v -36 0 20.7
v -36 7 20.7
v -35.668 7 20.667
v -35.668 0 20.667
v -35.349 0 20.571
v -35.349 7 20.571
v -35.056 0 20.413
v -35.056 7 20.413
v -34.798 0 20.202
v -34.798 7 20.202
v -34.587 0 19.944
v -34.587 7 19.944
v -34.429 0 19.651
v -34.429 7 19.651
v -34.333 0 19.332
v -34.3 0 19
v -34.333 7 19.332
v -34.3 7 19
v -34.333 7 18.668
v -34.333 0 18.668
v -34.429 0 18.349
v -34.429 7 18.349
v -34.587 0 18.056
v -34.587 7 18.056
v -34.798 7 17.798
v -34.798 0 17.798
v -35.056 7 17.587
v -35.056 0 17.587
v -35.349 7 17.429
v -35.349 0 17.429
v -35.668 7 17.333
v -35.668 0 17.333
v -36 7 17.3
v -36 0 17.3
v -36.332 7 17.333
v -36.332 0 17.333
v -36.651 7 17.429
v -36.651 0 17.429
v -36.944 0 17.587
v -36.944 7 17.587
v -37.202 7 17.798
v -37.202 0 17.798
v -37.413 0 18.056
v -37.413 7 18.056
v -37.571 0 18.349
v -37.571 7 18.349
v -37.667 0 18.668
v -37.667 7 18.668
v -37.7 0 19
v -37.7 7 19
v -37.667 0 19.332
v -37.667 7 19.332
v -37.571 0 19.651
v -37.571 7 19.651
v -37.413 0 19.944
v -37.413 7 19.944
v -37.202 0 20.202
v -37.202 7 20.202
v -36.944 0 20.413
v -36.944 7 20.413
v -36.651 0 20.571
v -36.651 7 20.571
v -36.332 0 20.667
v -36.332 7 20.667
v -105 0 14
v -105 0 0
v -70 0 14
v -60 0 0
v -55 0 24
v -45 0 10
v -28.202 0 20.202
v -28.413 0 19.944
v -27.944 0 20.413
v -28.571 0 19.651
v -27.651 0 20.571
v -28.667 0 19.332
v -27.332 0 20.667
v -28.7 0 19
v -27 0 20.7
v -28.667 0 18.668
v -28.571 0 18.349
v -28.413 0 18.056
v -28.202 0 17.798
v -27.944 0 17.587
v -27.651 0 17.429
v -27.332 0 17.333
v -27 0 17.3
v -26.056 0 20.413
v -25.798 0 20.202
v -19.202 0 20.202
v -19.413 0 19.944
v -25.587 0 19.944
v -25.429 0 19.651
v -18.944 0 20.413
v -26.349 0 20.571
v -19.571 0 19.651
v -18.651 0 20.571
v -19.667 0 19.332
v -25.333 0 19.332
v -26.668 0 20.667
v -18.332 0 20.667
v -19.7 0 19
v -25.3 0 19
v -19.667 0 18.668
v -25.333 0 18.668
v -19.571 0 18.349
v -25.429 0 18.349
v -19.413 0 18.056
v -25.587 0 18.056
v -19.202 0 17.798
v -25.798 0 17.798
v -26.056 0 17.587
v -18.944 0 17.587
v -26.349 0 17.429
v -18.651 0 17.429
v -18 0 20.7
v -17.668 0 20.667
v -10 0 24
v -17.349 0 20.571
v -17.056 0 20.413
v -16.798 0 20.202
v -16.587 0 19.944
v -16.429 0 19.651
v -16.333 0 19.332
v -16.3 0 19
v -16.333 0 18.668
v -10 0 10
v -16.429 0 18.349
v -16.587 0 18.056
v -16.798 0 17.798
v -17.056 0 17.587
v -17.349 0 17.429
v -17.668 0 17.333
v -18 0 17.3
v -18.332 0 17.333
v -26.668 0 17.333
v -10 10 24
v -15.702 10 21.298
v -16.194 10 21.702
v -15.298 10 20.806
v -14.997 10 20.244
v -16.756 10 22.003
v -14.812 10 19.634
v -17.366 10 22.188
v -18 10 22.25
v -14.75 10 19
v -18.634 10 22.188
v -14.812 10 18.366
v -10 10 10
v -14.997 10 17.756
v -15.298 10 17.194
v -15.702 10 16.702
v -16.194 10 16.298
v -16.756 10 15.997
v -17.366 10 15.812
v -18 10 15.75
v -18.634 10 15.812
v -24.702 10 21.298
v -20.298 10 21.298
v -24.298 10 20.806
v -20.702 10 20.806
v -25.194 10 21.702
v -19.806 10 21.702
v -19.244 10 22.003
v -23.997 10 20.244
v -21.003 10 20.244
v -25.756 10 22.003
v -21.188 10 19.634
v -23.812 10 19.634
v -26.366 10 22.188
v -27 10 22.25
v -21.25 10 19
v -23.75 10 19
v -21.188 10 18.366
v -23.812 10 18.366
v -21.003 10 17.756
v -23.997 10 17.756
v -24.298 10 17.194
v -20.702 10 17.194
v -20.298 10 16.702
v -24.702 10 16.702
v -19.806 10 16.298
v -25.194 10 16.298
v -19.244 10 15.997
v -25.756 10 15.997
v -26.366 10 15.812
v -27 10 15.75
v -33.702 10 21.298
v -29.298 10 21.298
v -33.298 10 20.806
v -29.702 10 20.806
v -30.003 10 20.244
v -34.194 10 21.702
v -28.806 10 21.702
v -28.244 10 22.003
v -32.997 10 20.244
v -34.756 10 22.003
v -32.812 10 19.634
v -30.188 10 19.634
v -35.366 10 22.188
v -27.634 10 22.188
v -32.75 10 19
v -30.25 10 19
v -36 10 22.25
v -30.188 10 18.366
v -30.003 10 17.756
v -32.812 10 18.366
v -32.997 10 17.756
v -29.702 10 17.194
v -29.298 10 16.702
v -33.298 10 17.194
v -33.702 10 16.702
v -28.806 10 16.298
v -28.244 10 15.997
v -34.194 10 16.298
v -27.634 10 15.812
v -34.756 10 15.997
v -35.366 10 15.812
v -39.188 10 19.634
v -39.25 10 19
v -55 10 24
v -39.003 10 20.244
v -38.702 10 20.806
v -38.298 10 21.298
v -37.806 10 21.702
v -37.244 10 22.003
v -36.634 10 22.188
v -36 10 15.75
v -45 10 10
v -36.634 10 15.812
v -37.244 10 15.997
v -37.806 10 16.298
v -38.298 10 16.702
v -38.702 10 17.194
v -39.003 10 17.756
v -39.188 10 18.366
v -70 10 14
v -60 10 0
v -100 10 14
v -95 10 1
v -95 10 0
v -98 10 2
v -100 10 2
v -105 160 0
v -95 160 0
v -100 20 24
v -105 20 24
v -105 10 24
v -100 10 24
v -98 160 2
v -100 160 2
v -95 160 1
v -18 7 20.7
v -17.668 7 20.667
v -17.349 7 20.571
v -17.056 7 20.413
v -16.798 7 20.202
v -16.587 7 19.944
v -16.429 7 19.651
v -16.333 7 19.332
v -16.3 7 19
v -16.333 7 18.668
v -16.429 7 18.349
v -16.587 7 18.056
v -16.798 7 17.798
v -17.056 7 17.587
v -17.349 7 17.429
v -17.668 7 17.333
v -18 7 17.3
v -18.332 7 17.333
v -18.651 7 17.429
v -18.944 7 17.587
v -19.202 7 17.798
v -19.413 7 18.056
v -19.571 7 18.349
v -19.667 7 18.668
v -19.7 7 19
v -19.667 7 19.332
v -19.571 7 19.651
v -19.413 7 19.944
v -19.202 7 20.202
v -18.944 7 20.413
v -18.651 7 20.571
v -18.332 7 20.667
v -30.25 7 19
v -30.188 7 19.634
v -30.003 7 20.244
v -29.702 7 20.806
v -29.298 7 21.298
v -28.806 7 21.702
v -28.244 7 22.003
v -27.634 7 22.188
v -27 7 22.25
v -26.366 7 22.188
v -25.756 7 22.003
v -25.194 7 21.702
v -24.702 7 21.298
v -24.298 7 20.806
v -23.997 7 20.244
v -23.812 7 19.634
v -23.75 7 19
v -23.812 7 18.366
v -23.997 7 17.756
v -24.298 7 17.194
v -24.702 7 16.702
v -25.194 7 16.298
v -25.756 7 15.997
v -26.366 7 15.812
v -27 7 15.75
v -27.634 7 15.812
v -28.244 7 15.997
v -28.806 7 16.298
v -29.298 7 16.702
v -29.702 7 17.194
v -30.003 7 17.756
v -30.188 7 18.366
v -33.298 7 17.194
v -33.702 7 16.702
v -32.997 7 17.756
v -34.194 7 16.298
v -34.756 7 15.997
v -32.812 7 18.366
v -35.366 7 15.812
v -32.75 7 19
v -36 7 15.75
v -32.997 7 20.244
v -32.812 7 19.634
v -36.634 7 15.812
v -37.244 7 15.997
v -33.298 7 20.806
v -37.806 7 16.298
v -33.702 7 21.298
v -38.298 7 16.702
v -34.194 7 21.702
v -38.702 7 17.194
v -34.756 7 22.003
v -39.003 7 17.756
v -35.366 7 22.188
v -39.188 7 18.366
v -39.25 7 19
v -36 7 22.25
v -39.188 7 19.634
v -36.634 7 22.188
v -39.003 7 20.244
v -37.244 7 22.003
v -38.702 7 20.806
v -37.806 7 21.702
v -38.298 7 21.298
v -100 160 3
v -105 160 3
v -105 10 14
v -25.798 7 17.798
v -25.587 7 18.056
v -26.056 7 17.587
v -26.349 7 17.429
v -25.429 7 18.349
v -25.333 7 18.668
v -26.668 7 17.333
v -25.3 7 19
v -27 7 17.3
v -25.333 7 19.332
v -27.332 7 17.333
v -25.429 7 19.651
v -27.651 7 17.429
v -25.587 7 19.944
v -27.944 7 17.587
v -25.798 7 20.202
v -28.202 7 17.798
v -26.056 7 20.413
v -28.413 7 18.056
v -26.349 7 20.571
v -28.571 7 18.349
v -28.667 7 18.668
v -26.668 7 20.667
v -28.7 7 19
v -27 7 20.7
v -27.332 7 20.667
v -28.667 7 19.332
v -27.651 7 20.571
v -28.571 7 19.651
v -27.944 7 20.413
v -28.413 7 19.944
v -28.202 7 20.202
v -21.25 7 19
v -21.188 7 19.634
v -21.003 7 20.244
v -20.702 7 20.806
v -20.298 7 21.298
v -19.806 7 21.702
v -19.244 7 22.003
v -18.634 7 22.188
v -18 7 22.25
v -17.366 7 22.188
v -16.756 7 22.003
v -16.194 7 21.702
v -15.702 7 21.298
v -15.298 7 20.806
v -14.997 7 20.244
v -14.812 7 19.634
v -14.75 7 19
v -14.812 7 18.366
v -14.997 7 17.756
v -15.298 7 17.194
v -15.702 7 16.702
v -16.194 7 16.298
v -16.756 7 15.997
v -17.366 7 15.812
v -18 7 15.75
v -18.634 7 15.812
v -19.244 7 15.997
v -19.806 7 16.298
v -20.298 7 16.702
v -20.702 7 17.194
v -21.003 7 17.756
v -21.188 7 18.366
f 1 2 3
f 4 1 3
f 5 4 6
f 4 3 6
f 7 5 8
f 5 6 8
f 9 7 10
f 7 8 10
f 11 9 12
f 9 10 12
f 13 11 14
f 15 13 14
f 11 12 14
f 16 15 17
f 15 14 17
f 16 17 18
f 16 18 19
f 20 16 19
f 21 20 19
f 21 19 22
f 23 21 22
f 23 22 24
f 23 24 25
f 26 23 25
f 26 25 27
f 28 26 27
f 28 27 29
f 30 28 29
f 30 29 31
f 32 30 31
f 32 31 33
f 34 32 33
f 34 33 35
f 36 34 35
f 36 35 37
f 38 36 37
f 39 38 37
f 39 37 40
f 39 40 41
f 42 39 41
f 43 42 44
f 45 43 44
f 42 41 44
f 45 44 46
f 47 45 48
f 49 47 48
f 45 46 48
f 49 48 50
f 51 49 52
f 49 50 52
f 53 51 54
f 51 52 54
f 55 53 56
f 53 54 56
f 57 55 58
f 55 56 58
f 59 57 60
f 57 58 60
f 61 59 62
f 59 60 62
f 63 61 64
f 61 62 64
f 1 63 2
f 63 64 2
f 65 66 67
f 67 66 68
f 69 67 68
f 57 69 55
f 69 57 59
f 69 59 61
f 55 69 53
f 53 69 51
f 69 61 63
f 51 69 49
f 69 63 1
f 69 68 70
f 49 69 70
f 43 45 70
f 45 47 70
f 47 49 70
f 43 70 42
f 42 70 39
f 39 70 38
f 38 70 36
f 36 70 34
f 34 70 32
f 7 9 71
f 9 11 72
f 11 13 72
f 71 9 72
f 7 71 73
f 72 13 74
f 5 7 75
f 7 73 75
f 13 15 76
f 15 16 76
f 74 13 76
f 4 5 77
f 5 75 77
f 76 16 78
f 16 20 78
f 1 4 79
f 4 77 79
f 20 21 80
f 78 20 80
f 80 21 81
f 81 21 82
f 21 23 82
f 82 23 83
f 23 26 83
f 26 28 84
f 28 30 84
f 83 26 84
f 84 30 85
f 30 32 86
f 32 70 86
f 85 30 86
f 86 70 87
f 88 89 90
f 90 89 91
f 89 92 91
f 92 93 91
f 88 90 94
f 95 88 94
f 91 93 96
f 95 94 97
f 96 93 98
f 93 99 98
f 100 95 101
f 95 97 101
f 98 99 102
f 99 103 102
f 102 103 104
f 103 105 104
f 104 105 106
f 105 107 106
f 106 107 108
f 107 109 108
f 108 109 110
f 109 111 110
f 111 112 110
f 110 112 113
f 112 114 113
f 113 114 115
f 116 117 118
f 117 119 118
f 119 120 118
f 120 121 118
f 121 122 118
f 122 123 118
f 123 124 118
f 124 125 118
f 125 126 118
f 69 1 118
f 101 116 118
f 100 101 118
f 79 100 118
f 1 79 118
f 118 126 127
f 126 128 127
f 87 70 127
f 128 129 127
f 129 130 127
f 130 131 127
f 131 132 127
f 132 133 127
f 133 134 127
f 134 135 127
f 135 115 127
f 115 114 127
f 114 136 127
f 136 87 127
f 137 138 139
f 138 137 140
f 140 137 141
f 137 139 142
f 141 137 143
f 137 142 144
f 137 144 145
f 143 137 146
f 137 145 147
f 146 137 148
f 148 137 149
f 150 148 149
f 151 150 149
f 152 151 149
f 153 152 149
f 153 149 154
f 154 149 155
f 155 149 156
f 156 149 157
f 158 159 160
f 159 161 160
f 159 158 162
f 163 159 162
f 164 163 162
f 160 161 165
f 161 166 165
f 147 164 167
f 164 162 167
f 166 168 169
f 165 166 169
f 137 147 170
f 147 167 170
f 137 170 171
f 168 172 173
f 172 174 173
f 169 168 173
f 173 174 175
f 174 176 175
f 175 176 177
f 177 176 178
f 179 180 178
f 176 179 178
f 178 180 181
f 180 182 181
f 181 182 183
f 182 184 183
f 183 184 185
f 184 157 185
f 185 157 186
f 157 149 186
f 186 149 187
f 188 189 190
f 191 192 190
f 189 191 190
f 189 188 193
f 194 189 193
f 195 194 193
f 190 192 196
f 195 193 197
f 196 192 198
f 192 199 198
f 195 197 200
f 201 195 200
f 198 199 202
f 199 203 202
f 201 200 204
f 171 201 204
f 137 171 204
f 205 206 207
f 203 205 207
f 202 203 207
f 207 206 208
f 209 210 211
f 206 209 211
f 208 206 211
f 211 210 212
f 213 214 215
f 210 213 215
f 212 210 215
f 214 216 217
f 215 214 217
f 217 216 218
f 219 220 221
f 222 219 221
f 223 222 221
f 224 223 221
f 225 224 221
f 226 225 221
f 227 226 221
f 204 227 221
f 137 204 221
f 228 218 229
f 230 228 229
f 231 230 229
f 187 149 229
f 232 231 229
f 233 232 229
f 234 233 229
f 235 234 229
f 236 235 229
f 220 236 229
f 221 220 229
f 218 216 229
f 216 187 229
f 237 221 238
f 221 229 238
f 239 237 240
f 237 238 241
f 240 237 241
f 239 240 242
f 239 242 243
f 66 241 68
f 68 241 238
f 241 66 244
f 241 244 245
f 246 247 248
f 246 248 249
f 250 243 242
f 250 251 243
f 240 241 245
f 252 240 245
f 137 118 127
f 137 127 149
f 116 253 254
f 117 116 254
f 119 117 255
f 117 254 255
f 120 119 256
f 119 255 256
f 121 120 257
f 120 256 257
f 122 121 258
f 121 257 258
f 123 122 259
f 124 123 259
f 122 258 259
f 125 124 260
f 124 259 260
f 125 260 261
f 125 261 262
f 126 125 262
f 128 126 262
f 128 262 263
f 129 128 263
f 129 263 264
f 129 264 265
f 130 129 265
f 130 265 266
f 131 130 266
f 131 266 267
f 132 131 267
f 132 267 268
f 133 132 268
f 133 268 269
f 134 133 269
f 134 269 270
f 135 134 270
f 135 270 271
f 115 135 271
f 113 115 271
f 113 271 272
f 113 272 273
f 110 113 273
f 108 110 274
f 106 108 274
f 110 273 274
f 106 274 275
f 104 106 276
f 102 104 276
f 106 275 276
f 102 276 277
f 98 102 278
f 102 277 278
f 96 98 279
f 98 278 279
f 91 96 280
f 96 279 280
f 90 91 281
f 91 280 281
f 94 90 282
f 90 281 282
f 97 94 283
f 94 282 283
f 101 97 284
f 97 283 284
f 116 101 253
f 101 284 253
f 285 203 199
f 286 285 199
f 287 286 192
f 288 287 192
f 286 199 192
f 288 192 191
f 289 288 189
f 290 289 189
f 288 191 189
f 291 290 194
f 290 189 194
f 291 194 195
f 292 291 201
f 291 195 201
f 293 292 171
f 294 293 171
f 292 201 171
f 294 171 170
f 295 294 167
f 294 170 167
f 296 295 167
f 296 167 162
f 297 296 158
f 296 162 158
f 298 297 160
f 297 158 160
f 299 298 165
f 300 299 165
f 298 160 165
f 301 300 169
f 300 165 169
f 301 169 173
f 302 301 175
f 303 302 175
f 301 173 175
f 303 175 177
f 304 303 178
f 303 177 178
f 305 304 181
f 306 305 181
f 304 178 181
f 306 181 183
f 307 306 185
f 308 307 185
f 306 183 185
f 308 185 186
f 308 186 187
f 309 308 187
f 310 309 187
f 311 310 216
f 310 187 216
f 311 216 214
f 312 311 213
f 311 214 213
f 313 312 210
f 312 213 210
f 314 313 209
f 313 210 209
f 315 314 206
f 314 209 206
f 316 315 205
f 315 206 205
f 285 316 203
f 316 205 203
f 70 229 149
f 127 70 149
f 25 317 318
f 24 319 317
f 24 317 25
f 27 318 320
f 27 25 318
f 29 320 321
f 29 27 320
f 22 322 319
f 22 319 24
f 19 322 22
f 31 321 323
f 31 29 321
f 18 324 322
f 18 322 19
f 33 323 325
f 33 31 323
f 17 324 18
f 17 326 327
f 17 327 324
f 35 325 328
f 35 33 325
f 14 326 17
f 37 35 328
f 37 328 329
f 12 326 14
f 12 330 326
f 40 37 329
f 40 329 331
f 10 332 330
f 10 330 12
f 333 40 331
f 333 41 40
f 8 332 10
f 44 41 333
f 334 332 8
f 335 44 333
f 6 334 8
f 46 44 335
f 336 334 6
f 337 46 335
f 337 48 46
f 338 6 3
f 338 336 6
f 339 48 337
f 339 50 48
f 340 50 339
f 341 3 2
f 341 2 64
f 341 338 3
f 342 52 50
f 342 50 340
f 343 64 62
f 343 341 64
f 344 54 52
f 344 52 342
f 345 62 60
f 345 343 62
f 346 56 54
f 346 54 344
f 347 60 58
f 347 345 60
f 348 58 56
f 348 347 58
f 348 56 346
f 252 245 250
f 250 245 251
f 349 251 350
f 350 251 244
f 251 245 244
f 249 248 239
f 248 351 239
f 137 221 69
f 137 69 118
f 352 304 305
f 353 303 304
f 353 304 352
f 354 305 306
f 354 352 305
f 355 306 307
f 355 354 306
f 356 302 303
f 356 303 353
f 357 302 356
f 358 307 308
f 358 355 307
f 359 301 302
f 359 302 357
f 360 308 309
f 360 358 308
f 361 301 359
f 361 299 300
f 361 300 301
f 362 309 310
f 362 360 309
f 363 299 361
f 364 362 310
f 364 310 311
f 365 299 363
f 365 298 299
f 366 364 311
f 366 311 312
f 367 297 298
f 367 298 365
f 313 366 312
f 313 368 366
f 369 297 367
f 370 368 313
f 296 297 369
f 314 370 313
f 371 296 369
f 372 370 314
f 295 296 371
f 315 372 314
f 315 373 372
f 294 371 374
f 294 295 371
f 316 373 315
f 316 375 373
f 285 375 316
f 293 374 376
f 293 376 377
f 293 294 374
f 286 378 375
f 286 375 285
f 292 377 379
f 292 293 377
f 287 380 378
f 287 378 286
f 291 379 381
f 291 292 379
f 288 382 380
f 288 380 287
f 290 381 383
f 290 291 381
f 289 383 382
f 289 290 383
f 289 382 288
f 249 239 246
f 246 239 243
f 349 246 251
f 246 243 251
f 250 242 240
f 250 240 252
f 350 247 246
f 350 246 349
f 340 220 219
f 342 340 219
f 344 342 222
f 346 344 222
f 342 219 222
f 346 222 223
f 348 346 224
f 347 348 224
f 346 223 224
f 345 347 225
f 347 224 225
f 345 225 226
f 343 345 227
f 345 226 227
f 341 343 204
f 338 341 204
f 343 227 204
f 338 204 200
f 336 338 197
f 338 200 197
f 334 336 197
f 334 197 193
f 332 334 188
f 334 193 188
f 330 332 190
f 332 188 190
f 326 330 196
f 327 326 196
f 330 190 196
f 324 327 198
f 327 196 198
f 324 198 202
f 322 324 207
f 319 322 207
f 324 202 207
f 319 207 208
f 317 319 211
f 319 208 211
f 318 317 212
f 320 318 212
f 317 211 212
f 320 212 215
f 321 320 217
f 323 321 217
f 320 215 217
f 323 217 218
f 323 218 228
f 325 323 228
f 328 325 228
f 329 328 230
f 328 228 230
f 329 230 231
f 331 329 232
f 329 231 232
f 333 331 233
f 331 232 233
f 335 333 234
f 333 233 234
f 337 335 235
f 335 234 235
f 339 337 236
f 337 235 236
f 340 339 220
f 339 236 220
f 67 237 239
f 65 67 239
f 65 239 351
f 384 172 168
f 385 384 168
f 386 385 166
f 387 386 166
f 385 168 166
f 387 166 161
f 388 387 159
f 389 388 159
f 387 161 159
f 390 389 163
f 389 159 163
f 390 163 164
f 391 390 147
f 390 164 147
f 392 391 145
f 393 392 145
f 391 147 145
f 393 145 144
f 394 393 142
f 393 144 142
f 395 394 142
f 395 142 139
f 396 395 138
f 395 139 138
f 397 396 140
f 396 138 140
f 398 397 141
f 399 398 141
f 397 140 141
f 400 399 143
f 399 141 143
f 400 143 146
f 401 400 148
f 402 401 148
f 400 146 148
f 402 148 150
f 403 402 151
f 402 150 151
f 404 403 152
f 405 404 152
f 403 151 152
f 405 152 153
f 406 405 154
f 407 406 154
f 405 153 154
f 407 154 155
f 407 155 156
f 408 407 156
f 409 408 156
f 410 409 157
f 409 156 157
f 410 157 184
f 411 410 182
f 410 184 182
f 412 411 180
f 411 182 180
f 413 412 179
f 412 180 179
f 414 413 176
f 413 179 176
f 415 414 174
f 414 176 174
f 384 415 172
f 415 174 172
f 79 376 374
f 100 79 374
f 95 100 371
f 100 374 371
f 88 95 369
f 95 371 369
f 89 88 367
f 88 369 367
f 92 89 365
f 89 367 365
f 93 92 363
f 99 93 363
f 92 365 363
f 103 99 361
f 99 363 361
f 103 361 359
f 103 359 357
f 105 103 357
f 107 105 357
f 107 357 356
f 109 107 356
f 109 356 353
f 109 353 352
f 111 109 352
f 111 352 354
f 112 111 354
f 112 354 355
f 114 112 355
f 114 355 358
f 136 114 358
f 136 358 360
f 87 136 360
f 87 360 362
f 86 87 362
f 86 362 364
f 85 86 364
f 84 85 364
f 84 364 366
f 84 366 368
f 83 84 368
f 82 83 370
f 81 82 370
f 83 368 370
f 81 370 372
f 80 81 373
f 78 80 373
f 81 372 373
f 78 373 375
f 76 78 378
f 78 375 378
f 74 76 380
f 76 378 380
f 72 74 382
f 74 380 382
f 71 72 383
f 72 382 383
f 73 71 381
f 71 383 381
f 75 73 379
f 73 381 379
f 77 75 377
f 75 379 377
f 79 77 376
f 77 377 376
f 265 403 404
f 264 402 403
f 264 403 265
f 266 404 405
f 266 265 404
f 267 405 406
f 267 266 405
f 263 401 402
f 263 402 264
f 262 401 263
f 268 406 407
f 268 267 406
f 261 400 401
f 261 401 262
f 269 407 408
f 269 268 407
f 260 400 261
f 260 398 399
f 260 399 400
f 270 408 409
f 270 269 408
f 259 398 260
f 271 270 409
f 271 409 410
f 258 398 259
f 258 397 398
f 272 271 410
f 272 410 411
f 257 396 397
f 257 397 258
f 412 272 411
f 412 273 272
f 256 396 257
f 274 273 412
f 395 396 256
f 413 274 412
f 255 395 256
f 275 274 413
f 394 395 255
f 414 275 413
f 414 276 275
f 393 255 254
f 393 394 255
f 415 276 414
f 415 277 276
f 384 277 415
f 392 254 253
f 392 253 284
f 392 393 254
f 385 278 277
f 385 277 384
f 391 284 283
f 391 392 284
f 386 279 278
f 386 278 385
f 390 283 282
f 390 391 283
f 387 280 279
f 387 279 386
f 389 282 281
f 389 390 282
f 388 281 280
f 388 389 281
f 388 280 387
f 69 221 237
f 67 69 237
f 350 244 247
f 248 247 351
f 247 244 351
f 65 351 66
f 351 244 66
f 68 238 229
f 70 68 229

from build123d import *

# Parameters (mm, degrees)
AUFSATZ_LINEAR_AUSTRAGEN1_DEPTH = 2
AUFSATZ_LINEAR_AUSTRAGEN2_DEPTH = 22
SCHNITT_LINEAR_AUSTRAGEN1_REACH = 189.619
FASE1_SIZE                      = 1
FASE1_SIZE2                     = 3
SCHNITT_LINEAR_AUSTRAGEN2_REACH = 186.665
SKIZZE4_R                       = 1.7
SKIZZE5_R                       = 3.25
SCHNITT_LINEAR_AUSTRAGEN3_DEPTH = 3
SCHNITT_LINEAR_AUSTRAGEN4_REACH = 186.665


with BuildPart() as part:
    # Skizze1 → Aufsatz-Linear austragen1 (new body)
    with BuildSketch(Plane.XY):
        Polygon((-10, 10), (-95, 10), (-95, 160), (-105, 160), (-105, 0), (-10, 0), align=None)
    extrude(amount=AUFSATZ_LINEAR_AUSTRAGEN1_DEPTH)

    # Skizze2 → Aufsatz-Linear austragen2 (add)
    with BuildSketch(Plane.XY.offset(2)):
        Polygon((-105, 0), (-10, 0), (-10, 10), (-100, 10), (-100, 160), (-105, 160), align=None)
    extrude(amount=AUFSATZ_LINEAR_AUSTRAGEN2_DEPTH)

    # Skizze3 → Schnitt-Linear austragen1 (cut, up to next)
    with BuildSketch(Plane.ZY.offset(105), mode=Mode.PRIVATE) as schnitt_linear_austragen1_sk1:
        Polygon((3, 160), (24, 160), (24, 20), align=None)
    schnitt_linear_austragen1_tool1 = extrude(schnitt_linear_austragen1_sk1.sketch, amount=-SCHNITT_LINEAR_AUSTRAGEN1_REACH, mode=Mode.PRIVATE) & part.part
    add(schnitt_linear_austragen1_tool1.solids().sort_by_distance((-105, 113.333333, 17))[0], mode=Mode.SUBTRACT)

    # Fase1
    fase1_edges = [part.edges().sort_by_distance(p)[0] for p in [
        (-95, 85, 2),
    ]]
    fase1_side = [part.faces().sort_by_distance(p)[0] for p in [
        (-95, 85, 1),
    ]]
    chamfer(fase1_edges, length=FASE1_SIZE, length2=FASE1_SIZE2, reference=fase1_side[0])

    # Skizze4 → Schnitt-Linear austragen2 (cut, up to next)
    with BuildSketch(Plane(origin=(0, 10, 0), x_dir=(1, 0, 0), z_dir=(0, 1, 0)), mode=Mode.PRIVATE) as schnitt_linear_austragen2_sk1:
        with Locations(Location((-18, -19, 0), (0, 0, 270))):
            Circle(SKIZZE4_R)
    schnitt_linear_austragen2_tool1 = extrude(schnitt_linear_austragen2_sk1.sketch, amount=-SCHNITT_LINEAR_AUSTRAGEN2_REACH, mode=Mode.PRIVATE) & part.part
    # Skizze4 → Schnitt-Linear austragen2 (cut, up to next)
    with BuildSketch(Plane(origin=(0, 10, 0), x_dir=(1, 0, 0), z_dir=(0, 1, 0)), mode=Mode.PRIVATE) as schnitt_linear_austragen2_sk2:
        with Locations(Location((-27, -19, 0), (0, 0, 270))):
            Circle(SKIZZE4_R)
    schnitt_linear_austragen2_tool2 = extrude(schnitt_linear_austragen2_sk2.sketch, amount=-SCHNITT_LINEAR_AUSTRAGEN2_REACH, mode=Mode.PRIVATE) & part.part
    # Skizze4 → Schnitt-Linear austragen2 (cut, up to next)
    with BuildSketch(Plane(origin=(0, 10, 0), x_dir=(1, 0, 0), z_dir=(0, 1, 0)), mode=Mode.PRIVATE) as schnitt_linear_austragen2_sk3:
        with Locations(Location((-36, -19, 0), (0, 0, 270))):
            Circle(SKIZZE4_R)
    schnitt_linear_austragen2_tool3 = extrude(schnitt_linear_austragen2_sk3.sketch, amount=-SCHNITT_LINEAR_AUSTRAGEN2_REACH, mode=Mode.PRIVATE) & part.part
    add(schnitt_linear_austragen2_tool1.solids().sort_by_distance((-18, 10, 19))[0], mode=Mode.SUBTRACT)
    add(schnitt_linear_austragen2_tool2.solids().sort_by_distance((-27, 10, 19))[0], mode=Mode.SUBTRACT)
    add(schnitt_linear_austragen2_tool3.solids().sort_by_distance((-36, 10, 19))[0], mode=Mode.SUBTRACT)

    # Skizze5 → Schnitt-Linear austragen3 (cut)
    with BuildSketch(Plane(origin=(0, 10, 0), x_dir=(1, 0, 0), z_dir=(0, 1, 0))):
        with Locations(Location((-18, -19, 0), (0, 0, 180))):
            Circle(SKIZZE5_R)
        with Locations(Location((-27, -19, 0), (0, 0, 180))):
            Circle(SKIZZE5_R)
        with Locations(Location((-36, -19, 0), (0, 0, 180))):
            Circle(SKIZZE5_R)
    extrude(amount=-SCHNITT_LINEAR_AUSTRAGEN3_DEPTH, mode=Mode.SUBTRACT)

    # Skizze6 → Schnitt-Linear austragen4 (cut, up to next)
    with BuildSketch(Plane(origin=(0, 10, 0), x_dir=(1, 0, 0), z_dir=(0, 1, 0)), mode=Mode.PRIVATE) as schnitt_linear_austragen4_sk1:
        Polygon((-10, -10), (-10, 0), (-60, 0), (-45, -10), align=None)
    schnitt_linear_austragen4_tool1 = extrude(schnitt_linear_austragen4_sk1.sketch, amount=-SCHNITT_LINEAR_AUSTRAGEN4_REACH, mode=Mode.PRIVATE) & part.part
    # Skizze6 → Schnitt-Linear austragen4 (cut, up to next)
    with BuildSketch(Plane(origin=(0, 10, 0), x_dir=(1, 0, 0), z_dir=(0, 1, 0)), mode=Mode.PRIVATE) as schnitt_linear_austragen4_sk2:
        Polygon((-55, -24), (-70, -14), (-105, -14), (-105, -24), align=None)
    schnitt_linear_austragen4_tool2 = extrude(schnitt_linear_austragen4_sk2.sketch, amount=-SCHNITT_LINEAR_AUSTRAGEN4_REACH, mode=Mode.PRIVATE) & part.part
    add(schnitt_linear_austragen4_tool1.solids().sort_by_distance((-31.470588, 10, 4.705882))[0], mode=Mode.SUBTRACT)
    add(schnitt_linear_austragen4_tool2.solids().sort_by_distance((-83.529412, 10, 19.294118))[0], mode=Mode.SUBTRACT)


solid = part.part
